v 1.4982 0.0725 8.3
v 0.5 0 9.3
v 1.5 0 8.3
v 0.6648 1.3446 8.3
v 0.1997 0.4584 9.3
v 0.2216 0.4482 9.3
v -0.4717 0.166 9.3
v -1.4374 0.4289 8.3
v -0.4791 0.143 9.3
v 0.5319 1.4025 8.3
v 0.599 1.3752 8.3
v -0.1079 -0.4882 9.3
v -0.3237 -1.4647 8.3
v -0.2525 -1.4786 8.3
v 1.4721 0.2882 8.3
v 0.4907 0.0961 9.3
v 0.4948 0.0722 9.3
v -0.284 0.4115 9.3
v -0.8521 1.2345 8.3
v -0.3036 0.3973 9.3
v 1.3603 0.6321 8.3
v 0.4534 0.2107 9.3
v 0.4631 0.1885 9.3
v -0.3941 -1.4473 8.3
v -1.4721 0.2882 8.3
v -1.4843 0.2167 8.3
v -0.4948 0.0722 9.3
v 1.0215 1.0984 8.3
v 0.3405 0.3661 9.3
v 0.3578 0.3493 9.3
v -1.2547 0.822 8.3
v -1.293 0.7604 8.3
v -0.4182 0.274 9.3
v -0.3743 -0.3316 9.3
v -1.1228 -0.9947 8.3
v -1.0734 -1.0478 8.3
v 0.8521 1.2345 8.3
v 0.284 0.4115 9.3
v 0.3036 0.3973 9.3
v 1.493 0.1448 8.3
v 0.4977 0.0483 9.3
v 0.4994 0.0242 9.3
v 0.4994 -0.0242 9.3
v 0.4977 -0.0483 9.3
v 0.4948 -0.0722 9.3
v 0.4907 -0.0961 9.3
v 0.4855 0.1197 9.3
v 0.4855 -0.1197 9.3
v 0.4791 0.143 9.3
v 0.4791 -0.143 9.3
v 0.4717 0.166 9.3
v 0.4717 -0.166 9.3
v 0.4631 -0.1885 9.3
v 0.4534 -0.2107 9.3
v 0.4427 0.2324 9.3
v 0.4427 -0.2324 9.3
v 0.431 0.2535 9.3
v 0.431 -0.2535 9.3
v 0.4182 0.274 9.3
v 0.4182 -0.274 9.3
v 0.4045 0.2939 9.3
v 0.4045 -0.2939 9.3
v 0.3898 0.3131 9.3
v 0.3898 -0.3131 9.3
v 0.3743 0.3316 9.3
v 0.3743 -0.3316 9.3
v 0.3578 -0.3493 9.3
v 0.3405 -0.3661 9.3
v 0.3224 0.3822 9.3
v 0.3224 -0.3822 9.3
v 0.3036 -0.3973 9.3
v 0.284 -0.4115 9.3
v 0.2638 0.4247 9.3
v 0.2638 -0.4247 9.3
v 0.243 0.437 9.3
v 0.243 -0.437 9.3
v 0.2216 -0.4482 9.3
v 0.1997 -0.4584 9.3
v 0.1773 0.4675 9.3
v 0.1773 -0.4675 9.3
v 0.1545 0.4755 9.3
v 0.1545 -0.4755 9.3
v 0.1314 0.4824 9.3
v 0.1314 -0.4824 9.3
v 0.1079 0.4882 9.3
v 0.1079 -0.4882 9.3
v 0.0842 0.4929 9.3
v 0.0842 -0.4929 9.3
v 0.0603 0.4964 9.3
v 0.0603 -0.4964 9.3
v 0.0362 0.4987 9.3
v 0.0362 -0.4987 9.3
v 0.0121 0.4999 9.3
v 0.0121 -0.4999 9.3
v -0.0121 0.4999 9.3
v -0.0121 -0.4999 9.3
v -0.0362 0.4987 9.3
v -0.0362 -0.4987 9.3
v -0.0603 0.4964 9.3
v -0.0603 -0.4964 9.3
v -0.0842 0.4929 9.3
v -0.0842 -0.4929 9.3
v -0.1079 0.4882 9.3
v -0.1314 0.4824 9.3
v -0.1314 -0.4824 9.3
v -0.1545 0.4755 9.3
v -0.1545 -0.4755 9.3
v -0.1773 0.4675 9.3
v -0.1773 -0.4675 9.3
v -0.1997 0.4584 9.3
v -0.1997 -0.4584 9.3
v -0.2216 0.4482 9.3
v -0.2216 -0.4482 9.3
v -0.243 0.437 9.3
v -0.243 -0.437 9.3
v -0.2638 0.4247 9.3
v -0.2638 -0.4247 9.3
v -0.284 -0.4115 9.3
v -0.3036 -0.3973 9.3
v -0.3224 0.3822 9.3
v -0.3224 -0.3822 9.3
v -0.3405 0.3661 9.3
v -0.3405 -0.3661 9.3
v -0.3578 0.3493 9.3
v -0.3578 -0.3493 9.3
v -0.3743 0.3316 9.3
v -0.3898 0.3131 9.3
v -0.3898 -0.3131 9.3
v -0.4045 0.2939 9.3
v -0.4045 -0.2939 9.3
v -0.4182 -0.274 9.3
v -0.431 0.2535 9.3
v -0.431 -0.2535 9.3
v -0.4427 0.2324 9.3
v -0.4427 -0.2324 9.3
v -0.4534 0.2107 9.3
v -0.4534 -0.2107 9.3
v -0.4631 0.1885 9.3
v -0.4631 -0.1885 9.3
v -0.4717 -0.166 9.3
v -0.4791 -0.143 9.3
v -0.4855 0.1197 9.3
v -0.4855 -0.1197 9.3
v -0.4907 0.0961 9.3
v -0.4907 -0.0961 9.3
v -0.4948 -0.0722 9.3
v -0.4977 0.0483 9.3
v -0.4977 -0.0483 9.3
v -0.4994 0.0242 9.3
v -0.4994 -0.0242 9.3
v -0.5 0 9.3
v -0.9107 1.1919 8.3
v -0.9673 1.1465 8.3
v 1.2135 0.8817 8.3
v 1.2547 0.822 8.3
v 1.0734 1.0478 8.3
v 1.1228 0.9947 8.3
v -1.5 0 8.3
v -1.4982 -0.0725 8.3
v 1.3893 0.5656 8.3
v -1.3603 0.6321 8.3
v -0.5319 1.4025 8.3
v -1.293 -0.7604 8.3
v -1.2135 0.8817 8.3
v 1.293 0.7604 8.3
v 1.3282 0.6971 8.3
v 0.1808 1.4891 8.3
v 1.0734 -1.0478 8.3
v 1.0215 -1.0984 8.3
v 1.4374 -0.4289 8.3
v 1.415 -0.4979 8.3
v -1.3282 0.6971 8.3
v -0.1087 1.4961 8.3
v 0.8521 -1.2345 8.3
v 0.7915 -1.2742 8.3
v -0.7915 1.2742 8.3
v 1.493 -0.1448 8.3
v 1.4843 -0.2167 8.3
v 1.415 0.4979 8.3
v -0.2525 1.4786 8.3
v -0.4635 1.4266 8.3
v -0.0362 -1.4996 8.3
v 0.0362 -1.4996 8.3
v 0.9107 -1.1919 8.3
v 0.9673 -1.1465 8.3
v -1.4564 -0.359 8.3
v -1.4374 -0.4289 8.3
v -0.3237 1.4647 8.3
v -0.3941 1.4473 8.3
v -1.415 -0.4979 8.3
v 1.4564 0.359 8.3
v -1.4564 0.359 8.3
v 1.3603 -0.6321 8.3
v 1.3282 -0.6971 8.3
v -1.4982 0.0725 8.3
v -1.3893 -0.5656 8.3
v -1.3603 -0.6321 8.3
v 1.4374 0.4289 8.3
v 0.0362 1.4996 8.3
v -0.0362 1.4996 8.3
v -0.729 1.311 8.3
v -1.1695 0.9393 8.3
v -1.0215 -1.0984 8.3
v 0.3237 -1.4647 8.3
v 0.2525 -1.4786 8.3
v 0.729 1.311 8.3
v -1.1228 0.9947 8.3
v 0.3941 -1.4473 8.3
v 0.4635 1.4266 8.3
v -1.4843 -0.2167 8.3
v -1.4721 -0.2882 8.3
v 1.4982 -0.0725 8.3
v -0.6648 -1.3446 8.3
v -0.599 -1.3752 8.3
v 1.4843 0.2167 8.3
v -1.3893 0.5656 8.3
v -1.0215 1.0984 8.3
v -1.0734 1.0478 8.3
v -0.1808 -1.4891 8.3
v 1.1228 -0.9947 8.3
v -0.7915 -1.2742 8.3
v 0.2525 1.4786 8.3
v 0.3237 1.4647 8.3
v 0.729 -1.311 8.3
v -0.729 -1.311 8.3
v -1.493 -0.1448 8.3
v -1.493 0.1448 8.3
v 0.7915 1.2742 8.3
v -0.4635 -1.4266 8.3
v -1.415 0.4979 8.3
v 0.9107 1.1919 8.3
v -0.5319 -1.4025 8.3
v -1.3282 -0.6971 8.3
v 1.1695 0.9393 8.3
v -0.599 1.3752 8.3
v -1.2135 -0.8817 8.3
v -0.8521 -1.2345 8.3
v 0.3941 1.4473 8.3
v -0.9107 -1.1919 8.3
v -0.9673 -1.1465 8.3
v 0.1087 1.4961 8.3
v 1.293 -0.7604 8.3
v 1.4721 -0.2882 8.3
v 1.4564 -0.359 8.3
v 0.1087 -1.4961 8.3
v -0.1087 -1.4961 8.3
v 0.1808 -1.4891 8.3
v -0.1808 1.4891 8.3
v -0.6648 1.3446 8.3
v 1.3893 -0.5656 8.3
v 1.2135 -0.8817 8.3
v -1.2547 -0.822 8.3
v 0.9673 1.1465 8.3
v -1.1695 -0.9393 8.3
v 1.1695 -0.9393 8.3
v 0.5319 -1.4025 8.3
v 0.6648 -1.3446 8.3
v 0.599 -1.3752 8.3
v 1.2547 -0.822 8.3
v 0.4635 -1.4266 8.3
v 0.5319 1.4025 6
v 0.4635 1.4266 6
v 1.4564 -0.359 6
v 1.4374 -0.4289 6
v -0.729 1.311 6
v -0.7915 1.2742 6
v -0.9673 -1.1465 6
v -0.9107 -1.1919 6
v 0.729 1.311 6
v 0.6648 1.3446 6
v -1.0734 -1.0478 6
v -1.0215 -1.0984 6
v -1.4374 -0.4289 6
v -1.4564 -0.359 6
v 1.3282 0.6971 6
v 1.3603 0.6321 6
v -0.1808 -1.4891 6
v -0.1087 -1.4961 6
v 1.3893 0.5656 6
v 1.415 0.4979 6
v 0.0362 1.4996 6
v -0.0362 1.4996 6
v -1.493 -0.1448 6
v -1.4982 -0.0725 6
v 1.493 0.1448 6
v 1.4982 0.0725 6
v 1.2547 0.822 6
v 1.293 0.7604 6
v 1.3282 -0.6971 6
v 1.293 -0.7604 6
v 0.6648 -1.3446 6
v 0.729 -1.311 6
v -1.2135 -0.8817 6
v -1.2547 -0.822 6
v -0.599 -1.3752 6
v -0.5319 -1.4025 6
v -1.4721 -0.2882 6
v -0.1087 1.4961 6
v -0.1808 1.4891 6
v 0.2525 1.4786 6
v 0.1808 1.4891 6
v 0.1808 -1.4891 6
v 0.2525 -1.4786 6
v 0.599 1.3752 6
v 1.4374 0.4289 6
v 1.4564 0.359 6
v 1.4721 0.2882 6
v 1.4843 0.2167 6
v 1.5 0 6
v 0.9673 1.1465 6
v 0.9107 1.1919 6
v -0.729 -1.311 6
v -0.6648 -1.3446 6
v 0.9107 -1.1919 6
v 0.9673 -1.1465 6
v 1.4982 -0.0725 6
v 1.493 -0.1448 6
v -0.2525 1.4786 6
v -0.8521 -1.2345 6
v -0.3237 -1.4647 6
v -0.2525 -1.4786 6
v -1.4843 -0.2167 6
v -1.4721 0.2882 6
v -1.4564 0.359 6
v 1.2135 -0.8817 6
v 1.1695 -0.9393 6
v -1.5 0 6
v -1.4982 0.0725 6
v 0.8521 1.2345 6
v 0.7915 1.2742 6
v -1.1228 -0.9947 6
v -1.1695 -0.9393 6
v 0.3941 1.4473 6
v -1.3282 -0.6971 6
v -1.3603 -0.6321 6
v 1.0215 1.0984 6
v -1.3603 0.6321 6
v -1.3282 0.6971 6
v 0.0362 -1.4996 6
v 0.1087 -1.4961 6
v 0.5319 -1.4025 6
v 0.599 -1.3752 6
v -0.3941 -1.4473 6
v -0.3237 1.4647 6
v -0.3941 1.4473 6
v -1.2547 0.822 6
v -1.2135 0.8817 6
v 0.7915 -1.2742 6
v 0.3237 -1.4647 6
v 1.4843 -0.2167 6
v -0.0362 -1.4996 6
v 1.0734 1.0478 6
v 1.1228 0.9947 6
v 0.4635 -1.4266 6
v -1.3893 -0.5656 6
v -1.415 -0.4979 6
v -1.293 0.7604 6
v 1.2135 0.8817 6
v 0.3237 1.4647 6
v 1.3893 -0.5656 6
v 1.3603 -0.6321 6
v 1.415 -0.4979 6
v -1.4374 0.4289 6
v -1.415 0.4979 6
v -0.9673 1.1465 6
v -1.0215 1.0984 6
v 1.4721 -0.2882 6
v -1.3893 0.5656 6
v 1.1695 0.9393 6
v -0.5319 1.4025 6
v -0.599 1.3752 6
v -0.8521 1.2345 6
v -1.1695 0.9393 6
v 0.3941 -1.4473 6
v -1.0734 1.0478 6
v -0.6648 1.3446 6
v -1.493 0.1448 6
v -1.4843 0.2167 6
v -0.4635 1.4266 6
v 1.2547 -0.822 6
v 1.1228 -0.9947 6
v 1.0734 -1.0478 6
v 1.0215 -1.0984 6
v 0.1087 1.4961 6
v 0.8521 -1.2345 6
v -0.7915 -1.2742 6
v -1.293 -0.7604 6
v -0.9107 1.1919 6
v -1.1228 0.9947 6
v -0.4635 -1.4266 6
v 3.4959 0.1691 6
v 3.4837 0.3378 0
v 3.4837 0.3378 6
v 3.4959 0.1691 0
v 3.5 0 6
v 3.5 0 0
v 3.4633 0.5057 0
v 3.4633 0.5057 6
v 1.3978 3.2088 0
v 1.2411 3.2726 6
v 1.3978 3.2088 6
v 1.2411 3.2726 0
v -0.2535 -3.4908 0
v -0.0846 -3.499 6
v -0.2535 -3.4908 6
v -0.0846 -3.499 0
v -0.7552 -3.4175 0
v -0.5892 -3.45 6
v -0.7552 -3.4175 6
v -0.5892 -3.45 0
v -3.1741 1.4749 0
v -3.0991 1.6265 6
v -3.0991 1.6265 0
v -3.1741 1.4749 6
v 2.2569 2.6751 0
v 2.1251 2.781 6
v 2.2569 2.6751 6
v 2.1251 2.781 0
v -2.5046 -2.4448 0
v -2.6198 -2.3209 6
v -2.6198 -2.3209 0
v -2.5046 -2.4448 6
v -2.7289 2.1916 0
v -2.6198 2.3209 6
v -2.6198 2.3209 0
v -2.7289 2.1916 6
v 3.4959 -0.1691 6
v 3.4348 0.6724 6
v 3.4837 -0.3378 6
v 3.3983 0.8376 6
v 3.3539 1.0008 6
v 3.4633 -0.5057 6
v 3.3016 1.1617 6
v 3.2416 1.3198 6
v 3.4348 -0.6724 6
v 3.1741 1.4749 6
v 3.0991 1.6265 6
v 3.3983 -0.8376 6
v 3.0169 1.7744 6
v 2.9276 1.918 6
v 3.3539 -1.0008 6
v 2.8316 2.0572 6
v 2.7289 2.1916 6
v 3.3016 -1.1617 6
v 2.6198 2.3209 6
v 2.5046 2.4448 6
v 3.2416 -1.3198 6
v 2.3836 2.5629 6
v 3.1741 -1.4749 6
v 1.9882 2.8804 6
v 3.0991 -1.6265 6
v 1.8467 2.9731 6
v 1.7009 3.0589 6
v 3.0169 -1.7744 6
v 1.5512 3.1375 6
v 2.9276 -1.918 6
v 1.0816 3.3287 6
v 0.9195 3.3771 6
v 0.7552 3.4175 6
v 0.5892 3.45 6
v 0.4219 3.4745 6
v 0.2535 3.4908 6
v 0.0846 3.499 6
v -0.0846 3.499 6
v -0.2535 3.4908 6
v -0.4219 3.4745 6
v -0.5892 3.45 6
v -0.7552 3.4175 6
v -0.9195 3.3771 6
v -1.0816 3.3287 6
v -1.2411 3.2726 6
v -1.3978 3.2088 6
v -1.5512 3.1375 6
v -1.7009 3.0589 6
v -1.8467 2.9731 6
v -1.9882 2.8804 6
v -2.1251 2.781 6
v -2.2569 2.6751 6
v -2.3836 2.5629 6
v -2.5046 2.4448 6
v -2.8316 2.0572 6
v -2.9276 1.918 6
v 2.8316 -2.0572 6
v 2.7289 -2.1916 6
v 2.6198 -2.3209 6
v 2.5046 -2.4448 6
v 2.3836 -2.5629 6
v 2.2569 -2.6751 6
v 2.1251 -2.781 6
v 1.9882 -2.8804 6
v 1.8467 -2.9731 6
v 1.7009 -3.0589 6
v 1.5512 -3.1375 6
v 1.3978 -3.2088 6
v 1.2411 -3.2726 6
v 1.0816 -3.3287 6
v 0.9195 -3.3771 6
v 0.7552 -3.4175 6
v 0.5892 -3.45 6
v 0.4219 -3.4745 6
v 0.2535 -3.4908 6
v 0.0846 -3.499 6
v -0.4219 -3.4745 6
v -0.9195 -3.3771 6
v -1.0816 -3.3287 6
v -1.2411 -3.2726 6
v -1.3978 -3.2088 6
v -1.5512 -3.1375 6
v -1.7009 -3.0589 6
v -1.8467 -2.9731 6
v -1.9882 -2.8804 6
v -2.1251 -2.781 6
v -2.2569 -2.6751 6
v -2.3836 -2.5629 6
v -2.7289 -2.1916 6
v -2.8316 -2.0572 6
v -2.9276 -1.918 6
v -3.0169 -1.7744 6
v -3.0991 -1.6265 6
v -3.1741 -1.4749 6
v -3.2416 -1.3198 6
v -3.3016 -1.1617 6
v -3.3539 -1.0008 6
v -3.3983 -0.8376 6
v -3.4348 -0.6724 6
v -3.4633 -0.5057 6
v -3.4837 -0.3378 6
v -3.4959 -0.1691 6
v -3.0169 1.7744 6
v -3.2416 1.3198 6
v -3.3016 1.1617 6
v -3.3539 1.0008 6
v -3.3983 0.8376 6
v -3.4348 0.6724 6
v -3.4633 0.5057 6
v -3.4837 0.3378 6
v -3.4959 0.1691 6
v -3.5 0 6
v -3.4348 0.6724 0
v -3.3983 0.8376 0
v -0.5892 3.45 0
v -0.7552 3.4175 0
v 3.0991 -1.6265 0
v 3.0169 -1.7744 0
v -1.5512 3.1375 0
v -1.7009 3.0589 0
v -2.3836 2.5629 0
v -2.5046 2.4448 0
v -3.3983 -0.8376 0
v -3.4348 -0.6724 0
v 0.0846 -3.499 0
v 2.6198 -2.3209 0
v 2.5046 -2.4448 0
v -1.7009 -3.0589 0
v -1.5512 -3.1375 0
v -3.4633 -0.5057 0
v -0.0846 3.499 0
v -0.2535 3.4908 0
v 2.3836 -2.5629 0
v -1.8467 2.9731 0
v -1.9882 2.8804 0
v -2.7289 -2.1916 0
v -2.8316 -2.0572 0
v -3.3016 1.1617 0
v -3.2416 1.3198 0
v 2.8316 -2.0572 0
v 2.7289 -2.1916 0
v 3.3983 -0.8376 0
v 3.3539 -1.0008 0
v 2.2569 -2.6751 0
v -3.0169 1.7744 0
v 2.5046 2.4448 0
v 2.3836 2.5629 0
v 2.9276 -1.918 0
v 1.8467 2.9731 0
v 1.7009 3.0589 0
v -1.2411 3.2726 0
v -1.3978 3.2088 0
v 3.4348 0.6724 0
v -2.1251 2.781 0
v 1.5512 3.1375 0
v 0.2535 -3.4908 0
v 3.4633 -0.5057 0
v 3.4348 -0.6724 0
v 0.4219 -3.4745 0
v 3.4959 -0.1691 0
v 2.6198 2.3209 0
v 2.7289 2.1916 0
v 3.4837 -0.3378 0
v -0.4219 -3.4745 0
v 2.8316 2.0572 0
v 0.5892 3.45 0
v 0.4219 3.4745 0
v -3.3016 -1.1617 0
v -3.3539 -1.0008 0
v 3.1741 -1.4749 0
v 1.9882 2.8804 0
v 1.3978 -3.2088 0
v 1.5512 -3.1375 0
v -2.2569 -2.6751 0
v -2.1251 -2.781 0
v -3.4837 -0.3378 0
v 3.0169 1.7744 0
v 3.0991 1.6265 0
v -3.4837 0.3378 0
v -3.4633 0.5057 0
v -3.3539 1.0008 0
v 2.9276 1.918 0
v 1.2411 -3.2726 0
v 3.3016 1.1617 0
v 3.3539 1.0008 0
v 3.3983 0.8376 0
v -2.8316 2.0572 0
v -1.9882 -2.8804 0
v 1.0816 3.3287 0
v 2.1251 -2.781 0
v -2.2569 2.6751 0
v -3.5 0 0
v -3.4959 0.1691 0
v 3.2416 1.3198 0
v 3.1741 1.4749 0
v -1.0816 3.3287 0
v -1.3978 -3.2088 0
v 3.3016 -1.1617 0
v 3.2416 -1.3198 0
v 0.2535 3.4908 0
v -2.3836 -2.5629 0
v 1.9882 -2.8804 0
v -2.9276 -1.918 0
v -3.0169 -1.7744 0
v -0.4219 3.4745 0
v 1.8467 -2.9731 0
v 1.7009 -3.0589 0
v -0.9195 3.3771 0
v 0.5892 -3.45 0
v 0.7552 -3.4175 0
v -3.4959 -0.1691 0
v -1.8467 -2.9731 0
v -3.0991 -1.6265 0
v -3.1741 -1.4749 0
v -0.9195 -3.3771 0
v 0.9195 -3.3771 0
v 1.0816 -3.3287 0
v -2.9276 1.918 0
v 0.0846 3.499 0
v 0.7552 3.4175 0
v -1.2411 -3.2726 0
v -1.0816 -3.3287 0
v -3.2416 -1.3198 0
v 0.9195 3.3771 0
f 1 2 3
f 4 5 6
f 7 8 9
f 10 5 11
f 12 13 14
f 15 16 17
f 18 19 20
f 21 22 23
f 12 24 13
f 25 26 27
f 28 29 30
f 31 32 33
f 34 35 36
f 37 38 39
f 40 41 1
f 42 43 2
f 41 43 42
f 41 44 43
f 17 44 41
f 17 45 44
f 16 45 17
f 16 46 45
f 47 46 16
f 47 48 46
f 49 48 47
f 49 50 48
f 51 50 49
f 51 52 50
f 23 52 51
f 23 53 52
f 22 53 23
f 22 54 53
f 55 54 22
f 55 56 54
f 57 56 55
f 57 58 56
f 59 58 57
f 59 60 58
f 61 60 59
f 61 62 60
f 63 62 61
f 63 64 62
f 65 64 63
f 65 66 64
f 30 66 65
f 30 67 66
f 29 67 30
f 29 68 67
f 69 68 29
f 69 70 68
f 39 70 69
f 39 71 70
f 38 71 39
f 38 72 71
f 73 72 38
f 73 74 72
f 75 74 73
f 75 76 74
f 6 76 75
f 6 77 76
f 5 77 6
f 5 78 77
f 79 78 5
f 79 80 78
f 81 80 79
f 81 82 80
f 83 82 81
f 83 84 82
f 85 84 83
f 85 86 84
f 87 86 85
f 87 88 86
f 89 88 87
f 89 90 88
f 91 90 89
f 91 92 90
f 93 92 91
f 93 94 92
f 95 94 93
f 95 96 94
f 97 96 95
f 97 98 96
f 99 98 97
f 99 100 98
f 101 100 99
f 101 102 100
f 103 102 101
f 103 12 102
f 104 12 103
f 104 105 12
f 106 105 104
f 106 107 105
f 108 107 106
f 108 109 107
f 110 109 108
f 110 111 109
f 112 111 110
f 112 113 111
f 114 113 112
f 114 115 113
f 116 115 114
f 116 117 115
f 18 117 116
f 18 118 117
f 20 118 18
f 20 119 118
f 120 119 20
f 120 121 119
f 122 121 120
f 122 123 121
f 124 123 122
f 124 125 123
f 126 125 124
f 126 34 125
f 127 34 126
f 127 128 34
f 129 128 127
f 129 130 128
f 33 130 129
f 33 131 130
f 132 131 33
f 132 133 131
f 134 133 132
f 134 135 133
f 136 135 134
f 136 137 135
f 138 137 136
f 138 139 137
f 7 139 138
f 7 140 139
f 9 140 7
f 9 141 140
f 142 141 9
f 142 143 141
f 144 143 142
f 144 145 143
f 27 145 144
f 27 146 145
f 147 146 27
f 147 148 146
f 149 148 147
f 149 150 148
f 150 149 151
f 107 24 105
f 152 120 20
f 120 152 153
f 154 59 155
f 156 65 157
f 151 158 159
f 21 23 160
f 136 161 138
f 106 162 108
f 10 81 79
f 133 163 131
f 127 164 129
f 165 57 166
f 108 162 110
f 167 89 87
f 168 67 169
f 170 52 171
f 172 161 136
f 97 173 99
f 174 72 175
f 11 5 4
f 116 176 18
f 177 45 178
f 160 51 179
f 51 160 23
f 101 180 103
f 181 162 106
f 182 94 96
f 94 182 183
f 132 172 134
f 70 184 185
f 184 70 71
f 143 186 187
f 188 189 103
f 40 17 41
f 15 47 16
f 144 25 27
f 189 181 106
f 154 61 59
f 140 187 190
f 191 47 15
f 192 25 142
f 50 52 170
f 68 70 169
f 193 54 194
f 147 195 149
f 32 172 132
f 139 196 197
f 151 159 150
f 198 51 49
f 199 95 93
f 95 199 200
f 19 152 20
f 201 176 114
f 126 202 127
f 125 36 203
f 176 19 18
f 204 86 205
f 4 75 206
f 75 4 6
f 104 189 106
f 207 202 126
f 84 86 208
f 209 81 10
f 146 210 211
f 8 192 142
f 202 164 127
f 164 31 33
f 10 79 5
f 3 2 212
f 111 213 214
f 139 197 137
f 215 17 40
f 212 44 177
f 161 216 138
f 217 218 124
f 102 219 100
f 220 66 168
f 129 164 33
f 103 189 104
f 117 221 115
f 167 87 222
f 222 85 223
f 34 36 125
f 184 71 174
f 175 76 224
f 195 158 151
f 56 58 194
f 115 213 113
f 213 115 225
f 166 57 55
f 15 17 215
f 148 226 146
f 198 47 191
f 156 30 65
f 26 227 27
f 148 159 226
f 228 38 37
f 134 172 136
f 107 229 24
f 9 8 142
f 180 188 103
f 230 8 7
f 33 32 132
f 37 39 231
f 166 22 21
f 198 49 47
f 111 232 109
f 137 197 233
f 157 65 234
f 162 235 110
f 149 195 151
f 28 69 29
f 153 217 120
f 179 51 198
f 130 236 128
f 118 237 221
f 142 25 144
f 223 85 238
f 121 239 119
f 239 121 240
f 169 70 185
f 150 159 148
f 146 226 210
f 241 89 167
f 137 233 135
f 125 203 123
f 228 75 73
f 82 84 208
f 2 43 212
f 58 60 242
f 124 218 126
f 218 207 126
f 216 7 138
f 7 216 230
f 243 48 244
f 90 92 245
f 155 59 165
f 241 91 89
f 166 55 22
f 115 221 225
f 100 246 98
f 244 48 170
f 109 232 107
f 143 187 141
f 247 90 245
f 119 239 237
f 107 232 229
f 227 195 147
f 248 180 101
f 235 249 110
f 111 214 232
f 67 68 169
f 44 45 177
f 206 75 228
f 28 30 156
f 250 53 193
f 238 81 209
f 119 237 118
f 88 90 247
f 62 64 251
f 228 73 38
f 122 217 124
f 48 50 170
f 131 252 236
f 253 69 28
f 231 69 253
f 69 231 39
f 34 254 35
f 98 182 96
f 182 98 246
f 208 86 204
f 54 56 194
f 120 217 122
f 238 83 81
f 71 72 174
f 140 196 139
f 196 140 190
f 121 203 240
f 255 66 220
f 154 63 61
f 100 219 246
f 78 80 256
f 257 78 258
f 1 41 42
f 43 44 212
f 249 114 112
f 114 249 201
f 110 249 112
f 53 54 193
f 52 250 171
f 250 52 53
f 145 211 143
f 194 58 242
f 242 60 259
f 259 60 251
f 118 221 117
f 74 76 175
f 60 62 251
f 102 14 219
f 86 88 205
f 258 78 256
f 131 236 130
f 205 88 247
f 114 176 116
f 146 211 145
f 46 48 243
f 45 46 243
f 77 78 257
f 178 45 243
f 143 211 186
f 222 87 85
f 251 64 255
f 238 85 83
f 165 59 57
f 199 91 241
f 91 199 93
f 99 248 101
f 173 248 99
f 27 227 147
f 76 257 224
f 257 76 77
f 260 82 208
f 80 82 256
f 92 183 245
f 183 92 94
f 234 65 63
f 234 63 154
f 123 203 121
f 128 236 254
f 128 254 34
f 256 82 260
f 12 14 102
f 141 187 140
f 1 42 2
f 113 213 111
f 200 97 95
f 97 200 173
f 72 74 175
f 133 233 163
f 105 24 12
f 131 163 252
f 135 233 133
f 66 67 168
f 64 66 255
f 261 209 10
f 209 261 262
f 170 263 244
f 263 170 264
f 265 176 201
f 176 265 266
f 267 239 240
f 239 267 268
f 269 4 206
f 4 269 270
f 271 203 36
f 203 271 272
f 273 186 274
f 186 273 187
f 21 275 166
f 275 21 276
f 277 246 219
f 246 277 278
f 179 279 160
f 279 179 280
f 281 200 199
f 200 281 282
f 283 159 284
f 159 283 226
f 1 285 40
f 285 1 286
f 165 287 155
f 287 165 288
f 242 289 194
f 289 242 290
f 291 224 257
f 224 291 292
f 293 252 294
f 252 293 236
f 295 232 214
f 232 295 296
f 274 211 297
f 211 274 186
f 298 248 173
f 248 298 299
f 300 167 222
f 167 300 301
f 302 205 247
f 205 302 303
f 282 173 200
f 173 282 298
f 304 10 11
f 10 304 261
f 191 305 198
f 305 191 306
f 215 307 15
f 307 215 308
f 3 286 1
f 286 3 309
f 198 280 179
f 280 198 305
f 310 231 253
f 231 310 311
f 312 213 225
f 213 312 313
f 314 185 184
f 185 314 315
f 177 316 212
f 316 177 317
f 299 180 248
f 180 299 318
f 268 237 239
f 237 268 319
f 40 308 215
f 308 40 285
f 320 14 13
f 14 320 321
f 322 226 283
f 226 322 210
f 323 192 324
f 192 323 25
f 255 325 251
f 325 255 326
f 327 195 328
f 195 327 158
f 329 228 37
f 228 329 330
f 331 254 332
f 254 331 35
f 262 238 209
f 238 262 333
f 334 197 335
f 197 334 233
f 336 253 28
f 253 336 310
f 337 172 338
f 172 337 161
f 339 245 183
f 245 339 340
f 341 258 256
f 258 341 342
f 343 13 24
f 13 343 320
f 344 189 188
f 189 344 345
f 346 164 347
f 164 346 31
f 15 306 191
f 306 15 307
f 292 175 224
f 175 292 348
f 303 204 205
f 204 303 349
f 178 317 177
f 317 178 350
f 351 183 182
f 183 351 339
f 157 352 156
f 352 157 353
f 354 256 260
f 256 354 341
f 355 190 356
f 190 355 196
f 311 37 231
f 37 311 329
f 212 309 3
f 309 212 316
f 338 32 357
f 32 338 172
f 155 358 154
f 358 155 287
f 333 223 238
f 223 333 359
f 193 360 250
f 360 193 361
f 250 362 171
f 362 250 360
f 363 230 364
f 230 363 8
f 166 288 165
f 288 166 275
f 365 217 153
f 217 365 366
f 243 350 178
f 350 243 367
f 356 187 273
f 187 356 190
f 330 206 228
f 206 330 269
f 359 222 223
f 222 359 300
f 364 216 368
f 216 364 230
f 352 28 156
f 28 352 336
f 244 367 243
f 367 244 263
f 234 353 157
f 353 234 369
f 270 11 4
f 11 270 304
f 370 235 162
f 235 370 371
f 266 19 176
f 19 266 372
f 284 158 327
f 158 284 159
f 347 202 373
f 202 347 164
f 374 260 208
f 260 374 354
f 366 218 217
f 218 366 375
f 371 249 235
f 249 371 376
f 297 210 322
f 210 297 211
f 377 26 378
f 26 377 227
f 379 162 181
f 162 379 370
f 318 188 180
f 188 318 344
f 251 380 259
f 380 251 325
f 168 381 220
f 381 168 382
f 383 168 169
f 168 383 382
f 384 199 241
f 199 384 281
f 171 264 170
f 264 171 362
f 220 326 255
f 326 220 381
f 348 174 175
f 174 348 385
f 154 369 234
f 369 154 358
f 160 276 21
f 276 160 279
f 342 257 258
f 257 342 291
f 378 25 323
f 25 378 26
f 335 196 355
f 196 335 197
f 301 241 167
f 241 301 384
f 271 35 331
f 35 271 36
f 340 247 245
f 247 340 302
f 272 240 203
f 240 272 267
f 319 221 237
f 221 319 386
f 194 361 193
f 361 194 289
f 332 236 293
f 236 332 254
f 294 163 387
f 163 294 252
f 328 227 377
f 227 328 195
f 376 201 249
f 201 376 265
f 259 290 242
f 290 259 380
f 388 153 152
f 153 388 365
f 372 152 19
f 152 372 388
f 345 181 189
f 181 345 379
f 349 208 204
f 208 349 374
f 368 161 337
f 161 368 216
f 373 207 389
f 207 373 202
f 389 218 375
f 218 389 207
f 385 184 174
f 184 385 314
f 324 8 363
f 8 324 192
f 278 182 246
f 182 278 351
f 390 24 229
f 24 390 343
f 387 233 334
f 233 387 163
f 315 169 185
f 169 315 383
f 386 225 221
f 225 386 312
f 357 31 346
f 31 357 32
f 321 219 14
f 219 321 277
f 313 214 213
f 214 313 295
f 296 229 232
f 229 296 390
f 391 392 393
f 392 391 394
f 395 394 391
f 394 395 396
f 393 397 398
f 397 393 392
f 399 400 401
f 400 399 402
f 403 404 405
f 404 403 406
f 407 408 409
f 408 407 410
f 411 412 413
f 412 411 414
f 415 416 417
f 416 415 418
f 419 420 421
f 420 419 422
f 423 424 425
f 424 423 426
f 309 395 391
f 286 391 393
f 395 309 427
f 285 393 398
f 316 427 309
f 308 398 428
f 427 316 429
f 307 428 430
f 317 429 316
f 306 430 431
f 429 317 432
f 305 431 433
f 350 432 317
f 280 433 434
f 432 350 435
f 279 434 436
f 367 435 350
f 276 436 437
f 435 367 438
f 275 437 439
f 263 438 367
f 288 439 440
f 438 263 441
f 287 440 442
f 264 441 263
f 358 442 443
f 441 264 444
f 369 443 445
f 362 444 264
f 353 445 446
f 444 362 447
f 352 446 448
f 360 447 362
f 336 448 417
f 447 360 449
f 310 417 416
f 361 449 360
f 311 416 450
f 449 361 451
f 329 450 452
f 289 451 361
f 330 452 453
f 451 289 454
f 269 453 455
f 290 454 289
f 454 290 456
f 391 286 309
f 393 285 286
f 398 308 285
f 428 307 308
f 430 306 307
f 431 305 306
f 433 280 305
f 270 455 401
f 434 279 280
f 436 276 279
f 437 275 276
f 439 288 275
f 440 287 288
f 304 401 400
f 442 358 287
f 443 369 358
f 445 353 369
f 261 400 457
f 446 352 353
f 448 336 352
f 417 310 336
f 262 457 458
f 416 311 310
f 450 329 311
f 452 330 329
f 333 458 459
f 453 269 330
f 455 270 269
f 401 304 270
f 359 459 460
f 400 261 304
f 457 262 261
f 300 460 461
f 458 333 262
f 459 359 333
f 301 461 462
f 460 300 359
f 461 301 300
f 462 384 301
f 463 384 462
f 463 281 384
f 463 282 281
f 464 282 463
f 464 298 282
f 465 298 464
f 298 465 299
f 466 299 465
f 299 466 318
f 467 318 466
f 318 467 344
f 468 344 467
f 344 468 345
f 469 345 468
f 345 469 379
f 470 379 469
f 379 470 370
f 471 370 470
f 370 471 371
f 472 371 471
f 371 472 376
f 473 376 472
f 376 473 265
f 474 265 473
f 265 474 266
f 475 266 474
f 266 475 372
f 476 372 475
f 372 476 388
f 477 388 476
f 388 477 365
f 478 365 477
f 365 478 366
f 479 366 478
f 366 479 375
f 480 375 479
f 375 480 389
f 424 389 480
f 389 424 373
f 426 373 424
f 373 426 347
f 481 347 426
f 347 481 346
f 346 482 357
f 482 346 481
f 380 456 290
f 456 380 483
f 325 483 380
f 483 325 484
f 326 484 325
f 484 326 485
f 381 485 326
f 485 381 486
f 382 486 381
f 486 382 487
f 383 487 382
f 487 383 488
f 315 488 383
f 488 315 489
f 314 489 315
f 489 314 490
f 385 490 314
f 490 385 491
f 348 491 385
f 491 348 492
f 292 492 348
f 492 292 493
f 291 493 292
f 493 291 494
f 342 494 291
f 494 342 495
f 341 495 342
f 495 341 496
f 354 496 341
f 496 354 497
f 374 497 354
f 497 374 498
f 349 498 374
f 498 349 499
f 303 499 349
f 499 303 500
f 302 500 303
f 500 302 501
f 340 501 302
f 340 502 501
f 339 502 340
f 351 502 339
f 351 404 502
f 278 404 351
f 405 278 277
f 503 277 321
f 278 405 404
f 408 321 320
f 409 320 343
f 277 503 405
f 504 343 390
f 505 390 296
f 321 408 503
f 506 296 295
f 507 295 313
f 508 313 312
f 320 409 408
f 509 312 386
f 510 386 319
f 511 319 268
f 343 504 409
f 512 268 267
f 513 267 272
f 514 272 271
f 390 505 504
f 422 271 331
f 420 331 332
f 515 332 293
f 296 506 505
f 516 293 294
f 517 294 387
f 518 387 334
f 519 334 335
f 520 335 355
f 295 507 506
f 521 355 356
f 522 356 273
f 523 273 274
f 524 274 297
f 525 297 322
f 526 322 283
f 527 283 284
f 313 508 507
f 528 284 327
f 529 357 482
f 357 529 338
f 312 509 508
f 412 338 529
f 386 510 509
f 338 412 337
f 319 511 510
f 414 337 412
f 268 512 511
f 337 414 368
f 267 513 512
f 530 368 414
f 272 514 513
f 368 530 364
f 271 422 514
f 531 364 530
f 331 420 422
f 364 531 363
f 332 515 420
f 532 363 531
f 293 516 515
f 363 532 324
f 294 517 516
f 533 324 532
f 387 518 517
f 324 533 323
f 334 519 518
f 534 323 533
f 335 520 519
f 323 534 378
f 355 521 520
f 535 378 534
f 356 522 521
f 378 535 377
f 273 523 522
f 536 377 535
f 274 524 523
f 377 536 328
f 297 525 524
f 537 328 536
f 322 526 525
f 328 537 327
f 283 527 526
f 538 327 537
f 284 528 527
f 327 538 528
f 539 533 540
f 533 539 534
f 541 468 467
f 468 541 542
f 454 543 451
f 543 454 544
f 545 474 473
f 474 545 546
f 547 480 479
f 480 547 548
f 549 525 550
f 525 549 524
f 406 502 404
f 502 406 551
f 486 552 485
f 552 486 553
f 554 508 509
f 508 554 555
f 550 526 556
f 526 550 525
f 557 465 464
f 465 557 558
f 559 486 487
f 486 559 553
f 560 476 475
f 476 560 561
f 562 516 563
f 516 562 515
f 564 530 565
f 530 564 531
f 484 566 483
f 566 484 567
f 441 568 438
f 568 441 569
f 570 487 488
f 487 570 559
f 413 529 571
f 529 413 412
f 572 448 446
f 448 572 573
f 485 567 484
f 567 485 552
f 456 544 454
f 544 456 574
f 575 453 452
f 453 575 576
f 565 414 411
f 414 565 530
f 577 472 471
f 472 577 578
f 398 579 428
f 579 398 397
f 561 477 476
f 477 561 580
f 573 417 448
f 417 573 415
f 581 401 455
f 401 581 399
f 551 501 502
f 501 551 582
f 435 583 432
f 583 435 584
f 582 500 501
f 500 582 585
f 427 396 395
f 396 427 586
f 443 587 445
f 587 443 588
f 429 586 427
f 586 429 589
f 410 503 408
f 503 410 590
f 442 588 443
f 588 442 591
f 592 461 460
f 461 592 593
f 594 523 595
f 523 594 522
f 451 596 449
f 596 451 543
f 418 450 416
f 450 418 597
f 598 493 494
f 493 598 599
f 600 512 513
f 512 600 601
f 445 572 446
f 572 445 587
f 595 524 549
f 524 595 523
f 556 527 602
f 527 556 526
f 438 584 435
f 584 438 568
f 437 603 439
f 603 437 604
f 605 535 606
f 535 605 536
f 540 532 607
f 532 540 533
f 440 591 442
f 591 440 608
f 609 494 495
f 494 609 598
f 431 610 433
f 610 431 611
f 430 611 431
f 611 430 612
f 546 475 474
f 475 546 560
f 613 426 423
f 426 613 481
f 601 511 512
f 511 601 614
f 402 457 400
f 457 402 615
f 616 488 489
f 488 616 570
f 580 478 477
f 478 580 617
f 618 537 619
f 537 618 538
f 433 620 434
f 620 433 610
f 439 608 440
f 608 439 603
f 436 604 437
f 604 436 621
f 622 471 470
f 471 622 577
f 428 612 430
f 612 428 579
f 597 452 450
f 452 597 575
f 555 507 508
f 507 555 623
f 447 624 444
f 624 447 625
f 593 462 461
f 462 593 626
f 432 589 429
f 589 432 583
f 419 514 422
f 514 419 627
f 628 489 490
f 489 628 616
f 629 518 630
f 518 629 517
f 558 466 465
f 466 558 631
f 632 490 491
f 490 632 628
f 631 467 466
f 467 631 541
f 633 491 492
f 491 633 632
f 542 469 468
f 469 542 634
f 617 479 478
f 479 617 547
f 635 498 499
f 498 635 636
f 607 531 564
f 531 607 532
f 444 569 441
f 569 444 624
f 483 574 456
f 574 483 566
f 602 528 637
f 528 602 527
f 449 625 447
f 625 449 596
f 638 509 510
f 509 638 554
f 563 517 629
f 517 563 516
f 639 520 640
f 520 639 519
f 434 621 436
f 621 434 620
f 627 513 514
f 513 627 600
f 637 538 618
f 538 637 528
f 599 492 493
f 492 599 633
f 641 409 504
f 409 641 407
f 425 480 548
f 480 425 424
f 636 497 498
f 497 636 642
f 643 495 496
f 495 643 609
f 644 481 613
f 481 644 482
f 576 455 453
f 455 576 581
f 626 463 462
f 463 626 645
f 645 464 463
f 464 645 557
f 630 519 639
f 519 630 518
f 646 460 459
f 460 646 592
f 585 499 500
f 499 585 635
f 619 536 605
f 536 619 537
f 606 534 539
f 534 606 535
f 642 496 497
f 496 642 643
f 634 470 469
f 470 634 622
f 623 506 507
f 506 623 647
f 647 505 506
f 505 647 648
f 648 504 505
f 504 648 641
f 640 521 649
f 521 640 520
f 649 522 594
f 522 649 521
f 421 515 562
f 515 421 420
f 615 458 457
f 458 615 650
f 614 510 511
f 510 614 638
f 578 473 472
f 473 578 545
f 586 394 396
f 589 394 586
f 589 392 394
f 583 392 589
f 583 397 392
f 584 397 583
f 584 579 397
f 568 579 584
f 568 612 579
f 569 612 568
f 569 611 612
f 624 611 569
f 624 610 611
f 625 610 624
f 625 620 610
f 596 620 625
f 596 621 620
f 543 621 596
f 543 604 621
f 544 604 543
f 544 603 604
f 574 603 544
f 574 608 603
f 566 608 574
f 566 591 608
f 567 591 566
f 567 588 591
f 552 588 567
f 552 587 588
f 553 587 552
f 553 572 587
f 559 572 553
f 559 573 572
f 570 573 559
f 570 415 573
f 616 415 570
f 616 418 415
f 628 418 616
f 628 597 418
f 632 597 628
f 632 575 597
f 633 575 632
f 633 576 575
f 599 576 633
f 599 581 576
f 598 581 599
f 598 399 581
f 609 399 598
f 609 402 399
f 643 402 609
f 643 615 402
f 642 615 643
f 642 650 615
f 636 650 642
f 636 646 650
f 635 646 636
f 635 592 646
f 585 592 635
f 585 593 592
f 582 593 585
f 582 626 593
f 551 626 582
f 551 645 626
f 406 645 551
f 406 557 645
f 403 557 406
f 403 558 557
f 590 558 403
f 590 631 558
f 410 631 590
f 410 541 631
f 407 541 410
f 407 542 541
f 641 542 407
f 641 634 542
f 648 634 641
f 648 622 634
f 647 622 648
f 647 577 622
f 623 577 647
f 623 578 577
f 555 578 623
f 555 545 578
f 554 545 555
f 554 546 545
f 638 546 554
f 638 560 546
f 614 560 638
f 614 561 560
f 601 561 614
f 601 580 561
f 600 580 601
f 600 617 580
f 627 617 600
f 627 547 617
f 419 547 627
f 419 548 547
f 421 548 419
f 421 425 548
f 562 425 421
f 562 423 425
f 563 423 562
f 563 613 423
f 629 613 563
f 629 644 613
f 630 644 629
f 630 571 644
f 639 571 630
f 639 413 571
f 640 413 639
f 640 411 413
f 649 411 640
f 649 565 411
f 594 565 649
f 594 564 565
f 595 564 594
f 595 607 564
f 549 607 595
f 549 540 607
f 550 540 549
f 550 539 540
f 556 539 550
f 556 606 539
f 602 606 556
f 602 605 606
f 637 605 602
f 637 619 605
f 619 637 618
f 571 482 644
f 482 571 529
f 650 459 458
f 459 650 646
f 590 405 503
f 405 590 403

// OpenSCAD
$fn=130;

D_sock=7;   //Sockeldurchmesser
D_knub=3;   //Knubbeldurchmesser
H_sock=6;   //Sockelhöhe
H_knub=9;   //Knubbelhöhe 10 = Knuppelsockel=1.3mm
S_knub=0;   //Schaftdurchmesser=Knubbeldurchmesser-0.5

/* Messen
translate([-0.4,-2.5,6])
 cube([3,1,2]);
*/



//Sockel
H=H_sock-6;
color("SlateGray")
//color("WhiteSmoke")
translate([0,0,H*-1])
cylinder (h=H_sock, d=D_sock);

difference(){

//Knubbl
//color("SlateGray")
color("WhiteSmoke")    

union(){

translate([0,0,H_knub-0.7])
cylinder (h=1, d1=D_knub, d2=D_knub-2);

translate([0,0,H_knub-2.7])
cylinder (h=1, d1=D_knub-S_knub, d2=D_knub);

translate([0,0,H_knub-1.7])
cylinder (h=1, d1=D_knub, d2=D_knub);

//Schaft
translate([0,0,5.3])
cylinder (h=2.5, d=D_knub-S_knub);   
}



}

//Knuppel-Shaft messen V3 Höhe = 1.3mm
//translate([2,-3,6])
// cube([0.9,5,1.3]);
